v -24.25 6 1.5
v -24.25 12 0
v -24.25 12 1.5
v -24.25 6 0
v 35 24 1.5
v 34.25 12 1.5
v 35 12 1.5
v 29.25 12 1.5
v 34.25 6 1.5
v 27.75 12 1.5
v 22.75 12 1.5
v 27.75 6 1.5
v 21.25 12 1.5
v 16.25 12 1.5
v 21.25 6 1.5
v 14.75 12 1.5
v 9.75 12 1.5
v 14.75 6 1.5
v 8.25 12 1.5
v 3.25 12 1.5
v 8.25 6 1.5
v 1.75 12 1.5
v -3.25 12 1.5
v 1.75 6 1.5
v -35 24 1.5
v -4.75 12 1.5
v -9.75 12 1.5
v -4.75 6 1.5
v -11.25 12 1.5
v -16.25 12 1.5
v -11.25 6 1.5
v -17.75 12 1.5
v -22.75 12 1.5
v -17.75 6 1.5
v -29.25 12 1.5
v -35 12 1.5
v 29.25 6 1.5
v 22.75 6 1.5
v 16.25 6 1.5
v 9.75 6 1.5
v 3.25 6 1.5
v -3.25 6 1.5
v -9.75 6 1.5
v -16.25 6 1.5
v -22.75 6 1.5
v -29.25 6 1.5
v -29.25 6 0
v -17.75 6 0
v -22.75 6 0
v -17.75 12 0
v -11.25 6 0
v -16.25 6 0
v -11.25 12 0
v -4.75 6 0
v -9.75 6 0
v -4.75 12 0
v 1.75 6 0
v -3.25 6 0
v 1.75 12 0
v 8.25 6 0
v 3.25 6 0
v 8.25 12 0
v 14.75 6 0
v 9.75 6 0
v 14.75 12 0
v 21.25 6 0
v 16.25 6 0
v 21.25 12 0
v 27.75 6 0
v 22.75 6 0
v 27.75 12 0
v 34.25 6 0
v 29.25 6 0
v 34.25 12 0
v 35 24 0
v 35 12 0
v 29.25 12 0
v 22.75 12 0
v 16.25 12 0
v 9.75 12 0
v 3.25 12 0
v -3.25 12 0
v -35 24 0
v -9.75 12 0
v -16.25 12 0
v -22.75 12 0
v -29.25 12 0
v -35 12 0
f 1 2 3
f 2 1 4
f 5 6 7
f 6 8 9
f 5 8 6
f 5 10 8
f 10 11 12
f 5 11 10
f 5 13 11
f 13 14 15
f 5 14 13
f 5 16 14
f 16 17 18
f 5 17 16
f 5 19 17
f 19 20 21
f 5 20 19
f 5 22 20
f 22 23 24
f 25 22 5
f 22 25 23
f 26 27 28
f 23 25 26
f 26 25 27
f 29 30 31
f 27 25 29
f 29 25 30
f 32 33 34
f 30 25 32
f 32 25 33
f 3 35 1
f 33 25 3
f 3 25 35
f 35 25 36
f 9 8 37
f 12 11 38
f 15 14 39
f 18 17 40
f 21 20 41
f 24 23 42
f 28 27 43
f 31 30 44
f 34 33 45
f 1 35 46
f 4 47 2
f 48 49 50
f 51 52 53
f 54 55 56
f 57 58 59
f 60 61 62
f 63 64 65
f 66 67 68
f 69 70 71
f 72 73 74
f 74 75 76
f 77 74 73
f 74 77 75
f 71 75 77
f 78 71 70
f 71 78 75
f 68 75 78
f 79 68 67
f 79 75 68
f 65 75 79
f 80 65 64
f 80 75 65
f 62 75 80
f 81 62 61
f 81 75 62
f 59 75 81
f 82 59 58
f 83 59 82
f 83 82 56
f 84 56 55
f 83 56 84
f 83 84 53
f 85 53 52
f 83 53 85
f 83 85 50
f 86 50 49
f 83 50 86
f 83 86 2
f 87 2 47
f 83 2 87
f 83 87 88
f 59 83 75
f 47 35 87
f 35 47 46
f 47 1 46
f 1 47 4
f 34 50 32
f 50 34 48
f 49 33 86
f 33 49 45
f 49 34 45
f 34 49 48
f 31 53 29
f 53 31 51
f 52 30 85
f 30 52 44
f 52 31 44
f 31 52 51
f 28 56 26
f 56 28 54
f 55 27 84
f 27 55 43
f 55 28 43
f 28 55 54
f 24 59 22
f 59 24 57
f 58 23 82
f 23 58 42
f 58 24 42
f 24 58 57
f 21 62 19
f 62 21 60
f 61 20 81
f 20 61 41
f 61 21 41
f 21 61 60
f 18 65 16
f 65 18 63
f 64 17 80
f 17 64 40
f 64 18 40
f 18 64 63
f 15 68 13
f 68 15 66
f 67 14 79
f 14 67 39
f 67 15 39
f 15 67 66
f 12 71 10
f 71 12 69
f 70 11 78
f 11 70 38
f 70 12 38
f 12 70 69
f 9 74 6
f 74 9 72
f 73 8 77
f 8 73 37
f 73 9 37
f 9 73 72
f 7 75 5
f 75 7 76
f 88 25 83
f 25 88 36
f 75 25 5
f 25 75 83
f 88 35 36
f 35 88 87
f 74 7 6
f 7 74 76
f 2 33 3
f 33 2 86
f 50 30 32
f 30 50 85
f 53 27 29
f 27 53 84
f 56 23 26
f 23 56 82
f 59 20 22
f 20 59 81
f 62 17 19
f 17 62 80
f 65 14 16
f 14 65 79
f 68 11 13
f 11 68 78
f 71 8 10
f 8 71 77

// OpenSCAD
// 10-well agarose gel comb, printed flat (Z = thickness)

// --- Named dimensions (mm) ---
plate_thick   = 1.5;   // Z thickness of the whole comb
spine_len     = 70.0;  // X length of the back bar (spine)
spine_width   = 12.0;  // Y width of the back bar
tooth_w       = 5.0;   // X width of each tooth
tooth_len     = 12.0;  // Y length of each tooth (hangs in -Y from the spine)
gap           = 1.5;   // X gap between neighbouring teeth
n_teeth       = 10;    // number of teeth

// Derived layout values
tooth_pitch   = tooth_w + gap;                       // centre-to-centre spacing in X
row_width     = n_teeth * tooth_w + (n_teeth - 1) * gap; // total X span of the tooth row
row_x0        = -row_width / 2;                      // left edge of the tooth row (centred on X)

// Spine occupies Y in [0, spine_width]; teeth hang in -Y from Y=0 down to Y=-tooth_len.
// The whole part is then shifted in Y so that the lowest point (tooth tips) sits at z-plane Y=0.
y_offset      = tooth_len;   // shift +Y so tooth tips are at Y=0 and spine top at Y=spine_width+tooth_len

$fn = 64;

// Build the comb in local coordinates (spine at Y in [0, spine_width], teeth in -Y),
// then translate up in Y so the part rests on the bed with its lowest face at Y=0.
translate([0, y_offset, 0])
union() {
    // Back bar (spine)
    translate([-spine_len/2, 0, 0])
        cube([spine_len, spine_width, plate_thick], center=[true, false, false]);

    // 10 rectangular teeth, centred as a row on the spine in X
    for (i = [0 : n_teeth-1]) {
        x_c = row_x0 + tooth_w/2 + i * tooth_pitch;   // centre X of tooth i
        translate([x_c, -tooth_len/2, 0])
            cube([tooth_w, tooth_len, plate_thick], center=[true, true, false]);
    }
}
